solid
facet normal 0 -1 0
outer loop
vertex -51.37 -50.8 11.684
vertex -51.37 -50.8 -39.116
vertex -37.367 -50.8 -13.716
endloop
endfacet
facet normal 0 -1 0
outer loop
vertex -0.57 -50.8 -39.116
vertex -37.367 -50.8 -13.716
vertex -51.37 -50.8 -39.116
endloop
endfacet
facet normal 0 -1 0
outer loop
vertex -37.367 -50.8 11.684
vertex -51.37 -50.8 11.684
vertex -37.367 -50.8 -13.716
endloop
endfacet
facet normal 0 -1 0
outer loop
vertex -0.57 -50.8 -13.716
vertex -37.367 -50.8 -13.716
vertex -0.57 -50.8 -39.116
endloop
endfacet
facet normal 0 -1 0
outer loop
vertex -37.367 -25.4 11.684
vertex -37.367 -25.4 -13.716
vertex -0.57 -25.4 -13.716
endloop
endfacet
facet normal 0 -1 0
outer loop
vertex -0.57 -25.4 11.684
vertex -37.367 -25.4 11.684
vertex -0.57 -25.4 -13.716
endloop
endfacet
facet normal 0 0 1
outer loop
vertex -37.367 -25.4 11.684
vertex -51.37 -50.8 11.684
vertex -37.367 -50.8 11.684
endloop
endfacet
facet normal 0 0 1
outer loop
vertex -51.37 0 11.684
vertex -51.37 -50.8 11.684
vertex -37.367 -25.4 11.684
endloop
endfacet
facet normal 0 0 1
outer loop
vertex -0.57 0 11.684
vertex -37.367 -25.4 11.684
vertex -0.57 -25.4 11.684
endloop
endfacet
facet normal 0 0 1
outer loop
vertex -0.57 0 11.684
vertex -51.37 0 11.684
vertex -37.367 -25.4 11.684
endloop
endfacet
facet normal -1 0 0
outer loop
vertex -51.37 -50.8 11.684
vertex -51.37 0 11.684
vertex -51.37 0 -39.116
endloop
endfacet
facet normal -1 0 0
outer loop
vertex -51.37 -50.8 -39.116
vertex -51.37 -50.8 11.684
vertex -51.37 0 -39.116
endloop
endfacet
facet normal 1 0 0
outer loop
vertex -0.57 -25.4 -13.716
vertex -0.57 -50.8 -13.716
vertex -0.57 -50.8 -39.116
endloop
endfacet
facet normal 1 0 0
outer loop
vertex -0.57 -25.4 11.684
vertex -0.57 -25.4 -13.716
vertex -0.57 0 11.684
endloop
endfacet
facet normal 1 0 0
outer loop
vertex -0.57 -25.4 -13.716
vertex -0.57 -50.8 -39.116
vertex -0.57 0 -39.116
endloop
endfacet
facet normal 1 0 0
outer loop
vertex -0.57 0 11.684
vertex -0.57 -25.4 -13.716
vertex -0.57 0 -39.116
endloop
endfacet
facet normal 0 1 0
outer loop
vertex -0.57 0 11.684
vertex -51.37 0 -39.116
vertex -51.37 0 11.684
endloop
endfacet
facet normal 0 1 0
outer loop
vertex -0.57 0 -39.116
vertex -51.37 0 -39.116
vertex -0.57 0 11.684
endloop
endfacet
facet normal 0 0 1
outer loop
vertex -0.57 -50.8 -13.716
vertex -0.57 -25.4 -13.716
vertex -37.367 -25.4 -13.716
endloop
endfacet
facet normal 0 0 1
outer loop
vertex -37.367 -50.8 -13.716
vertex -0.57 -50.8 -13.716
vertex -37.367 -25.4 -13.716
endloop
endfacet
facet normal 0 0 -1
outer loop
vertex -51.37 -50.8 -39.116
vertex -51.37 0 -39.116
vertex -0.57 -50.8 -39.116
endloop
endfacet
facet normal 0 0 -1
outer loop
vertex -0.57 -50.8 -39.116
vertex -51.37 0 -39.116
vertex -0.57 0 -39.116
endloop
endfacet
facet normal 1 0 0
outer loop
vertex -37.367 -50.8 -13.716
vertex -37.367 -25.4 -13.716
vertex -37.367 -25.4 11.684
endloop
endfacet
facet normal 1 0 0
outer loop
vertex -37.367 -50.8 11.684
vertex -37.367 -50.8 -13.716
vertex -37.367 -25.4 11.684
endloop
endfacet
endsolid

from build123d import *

# Parameters (mm, degrees)
F1_DEPTH = 50.8
F2_W     = 36.796042
F2_H     = 25.4
F3_DEPTH = 25.4


with BuildPart() as f1:
    # F0 (on Front) → F1 (new body)
    with BuildSketch(Plane.XZ):
        Polygon((-51.370482, -39.115857), (-0.570482, -39.115857), (-0.570482, -13.715857), (-37.366524, -13.715857), (-37.366524, 11.684143), (-51.370482, 11.684143), align=None)
    extrude(amount=F1_DEPTH)

    # F2 (on face) → F3 (join)
    with BuildSketch(Plane.XY.offset(-13.715857)):
        with Locations((-18.968503, -12.7)):
            Rectangle(F2_W, F2_H)
    extrude(amount=F3_DEPTH)


solid = f1.part
